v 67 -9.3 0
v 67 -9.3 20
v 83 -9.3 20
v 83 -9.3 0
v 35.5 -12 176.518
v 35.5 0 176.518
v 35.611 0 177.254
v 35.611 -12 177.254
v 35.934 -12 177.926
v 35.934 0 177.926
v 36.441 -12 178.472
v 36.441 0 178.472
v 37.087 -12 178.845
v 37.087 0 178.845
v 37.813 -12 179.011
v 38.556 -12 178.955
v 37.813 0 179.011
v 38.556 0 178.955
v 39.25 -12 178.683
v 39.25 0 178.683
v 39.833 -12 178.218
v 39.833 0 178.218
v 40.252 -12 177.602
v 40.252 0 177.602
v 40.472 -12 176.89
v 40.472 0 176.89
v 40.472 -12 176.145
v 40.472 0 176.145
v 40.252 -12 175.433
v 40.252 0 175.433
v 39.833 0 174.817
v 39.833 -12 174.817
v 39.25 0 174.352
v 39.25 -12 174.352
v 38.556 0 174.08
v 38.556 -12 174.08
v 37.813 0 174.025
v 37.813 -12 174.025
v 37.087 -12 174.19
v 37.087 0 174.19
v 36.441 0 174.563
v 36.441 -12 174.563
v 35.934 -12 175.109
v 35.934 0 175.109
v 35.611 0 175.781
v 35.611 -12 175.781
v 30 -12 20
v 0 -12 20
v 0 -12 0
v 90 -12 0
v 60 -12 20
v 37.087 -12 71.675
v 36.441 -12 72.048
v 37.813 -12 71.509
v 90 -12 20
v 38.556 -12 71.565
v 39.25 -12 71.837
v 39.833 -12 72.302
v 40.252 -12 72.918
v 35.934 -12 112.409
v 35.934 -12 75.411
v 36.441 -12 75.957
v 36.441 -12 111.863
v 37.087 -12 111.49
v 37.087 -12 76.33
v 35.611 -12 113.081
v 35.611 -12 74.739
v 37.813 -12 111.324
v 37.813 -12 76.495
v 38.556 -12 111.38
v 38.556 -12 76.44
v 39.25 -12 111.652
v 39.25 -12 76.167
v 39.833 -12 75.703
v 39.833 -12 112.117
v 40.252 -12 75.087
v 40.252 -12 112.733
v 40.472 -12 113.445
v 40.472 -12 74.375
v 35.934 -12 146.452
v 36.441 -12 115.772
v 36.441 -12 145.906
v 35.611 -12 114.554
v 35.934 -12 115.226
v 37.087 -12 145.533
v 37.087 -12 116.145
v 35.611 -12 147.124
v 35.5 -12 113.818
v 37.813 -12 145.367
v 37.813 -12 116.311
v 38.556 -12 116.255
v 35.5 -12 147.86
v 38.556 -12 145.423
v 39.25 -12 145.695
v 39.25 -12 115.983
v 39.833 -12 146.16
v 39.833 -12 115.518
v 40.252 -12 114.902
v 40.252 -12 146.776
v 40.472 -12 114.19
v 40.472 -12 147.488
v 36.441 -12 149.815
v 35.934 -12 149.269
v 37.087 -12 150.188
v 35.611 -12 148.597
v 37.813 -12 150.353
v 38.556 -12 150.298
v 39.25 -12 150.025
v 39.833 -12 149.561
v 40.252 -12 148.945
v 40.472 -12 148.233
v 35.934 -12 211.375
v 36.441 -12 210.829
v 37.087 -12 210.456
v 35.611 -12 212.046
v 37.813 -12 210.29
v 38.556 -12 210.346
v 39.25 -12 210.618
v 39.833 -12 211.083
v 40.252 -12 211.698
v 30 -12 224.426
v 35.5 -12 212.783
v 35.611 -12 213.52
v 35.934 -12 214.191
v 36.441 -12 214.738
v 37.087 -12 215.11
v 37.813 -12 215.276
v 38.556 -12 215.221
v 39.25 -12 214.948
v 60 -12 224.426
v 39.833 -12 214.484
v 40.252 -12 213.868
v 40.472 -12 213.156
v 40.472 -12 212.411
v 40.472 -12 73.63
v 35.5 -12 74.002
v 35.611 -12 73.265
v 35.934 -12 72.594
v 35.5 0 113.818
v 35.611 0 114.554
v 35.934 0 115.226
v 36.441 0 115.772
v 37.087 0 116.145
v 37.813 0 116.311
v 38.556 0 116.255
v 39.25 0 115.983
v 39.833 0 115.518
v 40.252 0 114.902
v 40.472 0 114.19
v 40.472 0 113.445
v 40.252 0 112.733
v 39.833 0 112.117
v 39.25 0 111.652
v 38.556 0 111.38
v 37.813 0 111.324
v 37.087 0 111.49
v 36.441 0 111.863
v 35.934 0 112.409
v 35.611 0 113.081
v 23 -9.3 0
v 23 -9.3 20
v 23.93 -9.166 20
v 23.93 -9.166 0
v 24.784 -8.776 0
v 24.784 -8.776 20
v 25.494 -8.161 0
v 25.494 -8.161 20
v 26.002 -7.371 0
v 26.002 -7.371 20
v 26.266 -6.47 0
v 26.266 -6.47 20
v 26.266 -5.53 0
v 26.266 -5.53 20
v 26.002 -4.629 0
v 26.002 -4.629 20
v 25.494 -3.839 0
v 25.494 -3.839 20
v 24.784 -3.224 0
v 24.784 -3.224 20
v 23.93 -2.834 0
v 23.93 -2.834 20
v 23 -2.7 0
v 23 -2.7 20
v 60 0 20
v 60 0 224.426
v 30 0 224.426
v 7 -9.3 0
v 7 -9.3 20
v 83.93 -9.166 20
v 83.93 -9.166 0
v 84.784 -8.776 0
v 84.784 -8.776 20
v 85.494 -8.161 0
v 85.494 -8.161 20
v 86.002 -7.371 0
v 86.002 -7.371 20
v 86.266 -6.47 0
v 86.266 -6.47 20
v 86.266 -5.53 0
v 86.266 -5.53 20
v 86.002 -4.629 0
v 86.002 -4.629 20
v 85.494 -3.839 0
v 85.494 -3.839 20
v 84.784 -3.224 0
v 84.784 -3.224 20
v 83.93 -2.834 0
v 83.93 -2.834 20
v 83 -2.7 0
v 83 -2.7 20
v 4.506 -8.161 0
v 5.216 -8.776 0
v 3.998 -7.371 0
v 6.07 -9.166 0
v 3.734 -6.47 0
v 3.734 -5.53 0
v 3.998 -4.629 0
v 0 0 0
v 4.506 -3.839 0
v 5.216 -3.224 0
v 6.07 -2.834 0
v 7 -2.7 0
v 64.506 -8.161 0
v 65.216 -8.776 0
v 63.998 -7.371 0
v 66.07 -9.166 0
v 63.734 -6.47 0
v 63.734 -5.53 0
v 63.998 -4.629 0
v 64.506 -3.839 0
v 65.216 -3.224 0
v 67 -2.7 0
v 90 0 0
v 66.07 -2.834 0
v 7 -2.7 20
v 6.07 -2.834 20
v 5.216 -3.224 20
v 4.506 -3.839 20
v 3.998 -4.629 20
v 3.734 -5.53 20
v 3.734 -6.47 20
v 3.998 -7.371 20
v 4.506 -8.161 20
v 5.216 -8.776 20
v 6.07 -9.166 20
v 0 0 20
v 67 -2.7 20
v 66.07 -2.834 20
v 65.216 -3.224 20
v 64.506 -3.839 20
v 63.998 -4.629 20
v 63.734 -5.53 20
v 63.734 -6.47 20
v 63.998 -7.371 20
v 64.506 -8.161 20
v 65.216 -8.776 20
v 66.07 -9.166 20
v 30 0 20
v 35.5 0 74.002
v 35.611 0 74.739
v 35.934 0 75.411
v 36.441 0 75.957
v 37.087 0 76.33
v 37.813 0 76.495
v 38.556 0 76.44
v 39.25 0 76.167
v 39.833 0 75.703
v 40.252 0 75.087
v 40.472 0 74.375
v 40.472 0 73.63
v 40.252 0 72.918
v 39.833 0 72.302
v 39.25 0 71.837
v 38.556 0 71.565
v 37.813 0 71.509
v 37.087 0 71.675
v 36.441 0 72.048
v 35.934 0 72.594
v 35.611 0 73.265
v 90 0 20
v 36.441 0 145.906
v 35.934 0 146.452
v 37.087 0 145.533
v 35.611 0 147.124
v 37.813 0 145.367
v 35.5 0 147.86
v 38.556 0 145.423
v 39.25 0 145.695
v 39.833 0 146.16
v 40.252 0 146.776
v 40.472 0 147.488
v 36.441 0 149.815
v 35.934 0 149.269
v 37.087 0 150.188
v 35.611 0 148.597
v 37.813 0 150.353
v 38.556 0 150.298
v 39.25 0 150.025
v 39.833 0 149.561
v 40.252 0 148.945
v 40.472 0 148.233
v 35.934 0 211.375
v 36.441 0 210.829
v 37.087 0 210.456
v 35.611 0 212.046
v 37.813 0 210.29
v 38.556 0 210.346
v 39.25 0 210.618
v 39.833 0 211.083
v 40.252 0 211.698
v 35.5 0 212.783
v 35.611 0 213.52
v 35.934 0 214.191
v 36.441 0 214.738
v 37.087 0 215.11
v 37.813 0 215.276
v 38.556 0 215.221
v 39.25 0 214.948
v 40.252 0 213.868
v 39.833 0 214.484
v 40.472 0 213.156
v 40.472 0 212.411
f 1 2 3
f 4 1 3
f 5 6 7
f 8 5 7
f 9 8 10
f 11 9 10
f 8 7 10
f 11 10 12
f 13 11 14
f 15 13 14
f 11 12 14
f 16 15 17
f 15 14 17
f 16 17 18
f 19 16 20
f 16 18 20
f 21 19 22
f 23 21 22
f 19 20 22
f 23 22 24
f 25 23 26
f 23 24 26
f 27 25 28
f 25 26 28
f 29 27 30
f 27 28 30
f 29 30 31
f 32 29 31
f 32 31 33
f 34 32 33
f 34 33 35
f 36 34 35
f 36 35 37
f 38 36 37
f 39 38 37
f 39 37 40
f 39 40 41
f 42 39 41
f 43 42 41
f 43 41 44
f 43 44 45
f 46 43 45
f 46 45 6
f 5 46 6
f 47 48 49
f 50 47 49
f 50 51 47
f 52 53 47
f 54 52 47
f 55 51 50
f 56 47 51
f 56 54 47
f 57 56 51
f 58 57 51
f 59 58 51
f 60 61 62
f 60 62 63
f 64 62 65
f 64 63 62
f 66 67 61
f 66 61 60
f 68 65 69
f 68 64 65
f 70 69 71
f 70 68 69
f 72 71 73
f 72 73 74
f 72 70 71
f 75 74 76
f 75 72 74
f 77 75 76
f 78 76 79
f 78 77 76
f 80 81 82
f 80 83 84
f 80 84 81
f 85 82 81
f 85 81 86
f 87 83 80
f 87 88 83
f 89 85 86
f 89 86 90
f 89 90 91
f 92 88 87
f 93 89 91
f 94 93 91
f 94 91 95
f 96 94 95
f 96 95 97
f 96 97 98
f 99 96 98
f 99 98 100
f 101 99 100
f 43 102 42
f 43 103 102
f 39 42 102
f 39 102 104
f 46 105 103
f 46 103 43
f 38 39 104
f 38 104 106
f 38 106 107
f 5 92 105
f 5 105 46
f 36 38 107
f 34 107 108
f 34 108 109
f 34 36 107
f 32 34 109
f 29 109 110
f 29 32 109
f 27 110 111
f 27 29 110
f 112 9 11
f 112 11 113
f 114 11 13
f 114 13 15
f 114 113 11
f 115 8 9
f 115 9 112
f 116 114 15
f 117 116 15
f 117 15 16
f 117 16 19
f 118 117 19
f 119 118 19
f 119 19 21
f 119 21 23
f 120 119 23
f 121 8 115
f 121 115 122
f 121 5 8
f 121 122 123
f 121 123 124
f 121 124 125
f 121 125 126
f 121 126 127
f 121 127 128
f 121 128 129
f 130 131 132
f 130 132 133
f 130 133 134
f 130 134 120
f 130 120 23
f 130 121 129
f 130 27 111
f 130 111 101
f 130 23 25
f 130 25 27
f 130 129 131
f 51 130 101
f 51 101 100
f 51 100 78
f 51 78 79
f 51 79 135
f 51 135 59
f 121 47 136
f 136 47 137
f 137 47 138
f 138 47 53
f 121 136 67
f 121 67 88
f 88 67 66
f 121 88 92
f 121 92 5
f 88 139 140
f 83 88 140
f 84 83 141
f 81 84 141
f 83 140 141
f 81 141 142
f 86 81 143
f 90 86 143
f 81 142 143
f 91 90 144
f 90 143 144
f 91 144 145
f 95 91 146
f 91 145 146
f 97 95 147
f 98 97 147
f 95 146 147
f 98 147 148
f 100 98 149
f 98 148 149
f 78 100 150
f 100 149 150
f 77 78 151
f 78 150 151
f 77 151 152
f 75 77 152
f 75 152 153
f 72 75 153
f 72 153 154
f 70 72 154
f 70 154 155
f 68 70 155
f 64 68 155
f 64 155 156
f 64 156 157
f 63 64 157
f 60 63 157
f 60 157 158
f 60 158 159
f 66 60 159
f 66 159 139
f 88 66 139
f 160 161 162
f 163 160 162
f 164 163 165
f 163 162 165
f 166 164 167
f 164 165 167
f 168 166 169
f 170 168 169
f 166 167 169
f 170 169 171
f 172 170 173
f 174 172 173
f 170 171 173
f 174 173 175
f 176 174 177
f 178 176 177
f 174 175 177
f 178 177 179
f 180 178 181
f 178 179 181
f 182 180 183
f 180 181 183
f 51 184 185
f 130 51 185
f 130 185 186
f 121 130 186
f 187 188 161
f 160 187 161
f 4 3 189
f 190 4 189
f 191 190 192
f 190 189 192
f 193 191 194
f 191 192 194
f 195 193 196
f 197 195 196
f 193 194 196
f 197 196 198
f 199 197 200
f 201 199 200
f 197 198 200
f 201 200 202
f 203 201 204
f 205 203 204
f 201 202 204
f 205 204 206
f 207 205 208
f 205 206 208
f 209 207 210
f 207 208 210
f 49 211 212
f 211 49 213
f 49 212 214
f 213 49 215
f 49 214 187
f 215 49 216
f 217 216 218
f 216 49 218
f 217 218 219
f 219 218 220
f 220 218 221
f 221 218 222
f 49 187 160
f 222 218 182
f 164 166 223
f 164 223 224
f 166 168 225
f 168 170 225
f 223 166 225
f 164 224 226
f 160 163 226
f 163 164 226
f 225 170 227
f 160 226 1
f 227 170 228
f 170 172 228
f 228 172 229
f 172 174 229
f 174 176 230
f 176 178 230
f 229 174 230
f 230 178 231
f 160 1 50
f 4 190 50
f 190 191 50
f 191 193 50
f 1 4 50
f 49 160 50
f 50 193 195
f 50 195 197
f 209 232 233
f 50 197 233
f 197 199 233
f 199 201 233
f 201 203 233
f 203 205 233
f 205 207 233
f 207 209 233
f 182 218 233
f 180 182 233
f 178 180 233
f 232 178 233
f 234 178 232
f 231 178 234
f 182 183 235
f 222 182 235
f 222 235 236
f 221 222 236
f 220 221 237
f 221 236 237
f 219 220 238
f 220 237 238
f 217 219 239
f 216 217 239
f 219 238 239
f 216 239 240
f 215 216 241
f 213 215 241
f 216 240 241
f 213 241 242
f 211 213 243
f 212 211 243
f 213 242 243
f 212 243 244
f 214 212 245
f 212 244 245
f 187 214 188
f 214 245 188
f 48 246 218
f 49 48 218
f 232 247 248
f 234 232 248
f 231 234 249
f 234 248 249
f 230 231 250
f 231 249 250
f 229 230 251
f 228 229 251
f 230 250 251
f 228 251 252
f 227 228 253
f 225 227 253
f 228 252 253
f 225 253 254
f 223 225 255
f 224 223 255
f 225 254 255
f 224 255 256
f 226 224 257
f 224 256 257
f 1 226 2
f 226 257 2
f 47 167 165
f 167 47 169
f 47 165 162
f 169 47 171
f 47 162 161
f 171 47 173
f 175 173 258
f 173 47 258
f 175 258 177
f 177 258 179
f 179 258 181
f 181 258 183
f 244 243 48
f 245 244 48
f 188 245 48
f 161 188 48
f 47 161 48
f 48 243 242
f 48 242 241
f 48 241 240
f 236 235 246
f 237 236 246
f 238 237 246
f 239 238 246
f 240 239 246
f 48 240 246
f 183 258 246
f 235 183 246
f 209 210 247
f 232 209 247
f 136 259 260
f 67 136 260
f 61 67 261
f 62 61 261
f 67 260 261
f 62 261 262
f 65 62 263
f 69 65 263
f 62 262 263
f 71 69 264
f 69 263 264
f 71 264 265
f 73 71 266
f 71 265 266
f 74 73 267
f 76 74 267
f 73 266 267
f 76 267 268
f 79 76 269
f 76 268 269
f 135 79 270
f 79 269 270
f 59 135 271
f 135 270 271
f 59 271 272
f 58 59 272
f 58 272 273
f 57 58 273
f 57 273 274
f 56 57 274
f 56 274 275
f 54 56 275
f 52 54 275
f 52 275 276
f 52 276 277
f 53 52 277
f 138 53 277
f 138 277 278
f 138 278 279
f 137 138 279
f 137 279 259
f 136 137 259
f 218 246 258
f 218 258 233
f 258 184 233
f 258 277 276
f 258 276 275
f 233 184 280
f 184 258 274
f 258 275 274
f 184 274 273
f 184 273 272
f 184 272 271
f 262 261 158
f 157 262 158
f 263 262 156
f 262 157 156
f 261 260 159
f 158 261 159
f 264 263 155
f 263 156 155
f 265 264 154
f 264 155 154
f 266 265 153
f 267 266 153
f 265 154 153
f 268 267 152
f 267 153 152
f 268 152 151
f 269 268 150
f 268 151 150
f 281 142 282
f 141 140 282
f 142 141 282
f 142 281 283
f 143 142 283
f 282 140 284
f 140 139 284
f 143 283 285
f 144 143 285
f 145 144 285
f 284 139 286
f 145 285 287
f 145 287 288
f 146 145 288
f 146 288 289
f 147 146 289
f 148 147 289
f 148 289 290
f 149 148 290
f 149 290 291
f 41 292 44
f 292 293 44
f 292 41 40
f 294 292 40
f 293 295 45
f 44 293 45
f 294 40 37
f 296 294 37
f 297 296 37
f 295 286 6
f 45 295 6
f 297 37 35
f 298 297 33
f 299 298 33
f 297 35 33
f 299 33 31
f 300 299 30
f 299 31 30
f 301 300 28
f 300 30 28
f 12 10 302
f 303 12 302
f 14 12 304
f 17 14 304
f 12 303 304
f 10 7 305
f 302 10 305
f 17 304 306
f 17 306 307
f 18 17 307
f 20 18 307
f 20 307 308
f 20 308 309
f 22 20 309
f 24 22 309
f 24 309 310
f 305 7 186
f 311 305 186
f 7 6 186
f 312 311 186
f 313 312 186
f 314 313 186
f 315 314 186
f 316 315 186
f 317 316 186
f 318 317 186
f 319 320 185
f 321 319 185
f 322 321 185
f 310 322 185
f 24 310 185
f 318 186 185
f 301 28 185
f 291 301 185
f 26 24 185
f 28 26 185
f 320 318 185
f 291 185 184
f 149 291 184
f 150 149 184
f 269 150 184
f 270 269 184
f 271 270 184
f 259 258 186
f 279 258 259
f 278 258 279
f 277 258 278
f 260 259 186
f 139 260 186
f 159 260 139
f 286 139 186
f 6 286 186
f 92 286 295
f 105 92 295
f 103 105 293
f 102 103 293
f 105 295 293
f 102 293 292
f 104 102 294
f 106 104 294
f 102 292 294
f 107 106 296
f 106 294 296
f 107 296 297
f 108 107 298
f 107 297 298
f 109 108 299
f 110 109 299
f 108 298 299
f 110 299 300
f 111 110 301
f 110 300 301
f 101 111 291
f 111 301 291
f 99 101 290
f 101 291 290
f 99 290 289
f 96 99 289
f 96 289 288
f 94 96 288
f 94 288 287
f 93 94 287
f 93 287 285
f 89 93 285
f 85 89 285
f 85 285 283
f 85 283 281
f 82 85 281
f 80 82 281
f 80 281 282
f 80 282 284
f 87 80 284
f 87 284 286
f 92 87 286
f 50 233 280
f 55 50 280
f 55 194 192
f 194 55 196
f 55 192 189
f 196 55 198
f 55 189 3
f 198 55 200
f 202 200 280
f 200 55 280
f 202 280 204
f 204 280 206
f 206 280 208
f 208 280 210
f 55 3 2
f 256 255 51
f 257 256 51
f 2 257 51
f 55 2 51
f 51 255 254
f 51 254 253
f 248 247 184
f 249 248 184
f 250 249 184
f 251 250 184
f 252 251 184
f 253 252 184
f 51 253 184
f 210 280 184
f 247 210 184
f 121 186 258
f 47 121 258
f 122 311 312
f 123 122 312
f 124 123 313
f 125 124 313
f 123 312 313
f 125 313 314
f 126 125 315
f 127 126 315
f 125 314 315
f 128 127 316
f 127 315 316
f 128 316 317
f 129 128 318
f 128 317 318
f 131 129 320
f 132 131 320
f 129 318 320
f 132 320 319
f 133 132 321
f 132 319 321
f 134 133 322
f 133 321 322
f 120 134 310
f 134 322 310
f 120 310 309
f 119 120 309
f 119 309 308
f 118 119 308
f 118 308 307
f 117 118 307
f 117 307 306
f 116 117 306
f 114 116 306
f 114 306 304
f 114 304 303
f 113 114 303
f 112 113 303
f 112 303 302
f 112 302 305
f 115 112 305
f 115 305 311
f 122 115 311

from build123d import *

# Parameters (mm, degrees)
F1_DEPTH = 12
F3_D     = 5
F6_DEPTH = 20.001


with BuildPart() as f1:
    # F0 (on Front) → F1 (new body)
    with BuildSketch(Plane.XZ):
        Polygon((0, 20), (0, 0), (90, 0), (90, 20), (60, 20), (60, 224.426331), (30, 224.426331), (30, 20), align=None)
    extrude(amount=F1_DEPTH)

    # F3 (through all)
    with Locations(Plane.XZ.offset(12)):
        with Locations((38, 212.783181), (38, 176.517542), (38, 147.860397), (38, 113.817503), (38, 74.002333)):
            Hole(F3_D / 2)

    # F4 (on face) + F5 (on face) → F6 (cut, through all)
    with BuildSketch(Plane.XY.offset(20)):
        with BuildLine():
            ThreePointArc((15, -9.3), (12.666548, -8.333452), (11.7, -6))
            ThreePointArc((11.7, -6), (12.666548, -3.666548), (15, -2.7))
            Line((15, -2.7), (7, -2.7))
            ThreePointArc((7, -2.7), (3.7, -6), (7, -9.3))
            Line((7, -9.3), (15, -9.3))
        make_face()
        with BuildLine():
            Line((18.3, -6), (15, -6))
            Line((15, -6), (11.7, -6))
            ThreePointArc((11.7, -6), (12.666548, -8.333452), (15, -9.3))
            ThreePointArc((15, -9.3), (17.333452, -8.333452), (18.3, -6))
        make_face()
        with BuildLine():
            ThreePointArc((15, -2.7), (17.333452, -3.666548), (18.3, -6))
            ThreePointArc((18.3, -6), (17.333452, -8.333452), (15, -9.3))
            Line((15, -9.3), (23, -9.3))
            ThreePointArc((23, -9.3), (26.3, -6), (23, -2.7))
            Line((23, -2.7), (15, -2.7))
        make_face()
        with BuildLine():
            Line((11.7, -6), (15, -6))
            Line((15, -6), (18.3, -6))
            ThreePointArc((18.3, -6), (17.333452, -3.666548), (15, -2.7))
            ThreePointArc((15, -2.7), (12.666548, -3.666548), (11.7, -6))
        make_face()
    with BuildSketch(Plane.XY.offset(20)):
        with BuildLine():
            ThreePointArc((75, -9.3), (72.666548, -8.333452), (71.7, -6))
            ThreePointArc((71.7, -6), (72.666548, -3.666548), (75, -2.7))
            Line((75, -2.7), (67, -2.7))
            ThreePointArc((67, -2.7), (63.7, -6), (67, -9.3))
            Line((67, -9.3), (75, -9.3))
        make_face()
        with BuildLine():
            Line((78.3, -6), (75, -6))
            Line((75, -6), (71.7, -6))
            ThreePointArc((71.7, -6), (72.666548, -8.333452), (75, -9.3))
            ThreePointArc((75, -9.3), (77.333452, -8.333452), (78.3, -6))
        make_face()
        with BuildLine():
            Line((71.7, -6), (75, -6))
            Line((75, -6), (78.3, -6))
            ThreePointArc((78.3, -6), (77.333452, -3.666548), (75, -2.7))
            ThreePointArc((75, -2.7), (72.666548, -3.666548), (71.7, -6))
        make_face()
        with BuildLine():
            ThreePointArc((75, -2.7), (77.333452, -3.666548), (78.3, -6))
            ThreePointArc((78.3, -6), (77.333452, -8.333452), (75, -9.3))
            Line((75, -9.3), (83, -9.3))
            ThreePointArc((83, -9.3), (86.3, -6), (83, -2.7))
            Line((83, -2.7), (75, -2.7))
        make_face()
    extrude(amount=-F6_DEPTH, mode=Mode.SUBTRACT)


solid = f1.part
